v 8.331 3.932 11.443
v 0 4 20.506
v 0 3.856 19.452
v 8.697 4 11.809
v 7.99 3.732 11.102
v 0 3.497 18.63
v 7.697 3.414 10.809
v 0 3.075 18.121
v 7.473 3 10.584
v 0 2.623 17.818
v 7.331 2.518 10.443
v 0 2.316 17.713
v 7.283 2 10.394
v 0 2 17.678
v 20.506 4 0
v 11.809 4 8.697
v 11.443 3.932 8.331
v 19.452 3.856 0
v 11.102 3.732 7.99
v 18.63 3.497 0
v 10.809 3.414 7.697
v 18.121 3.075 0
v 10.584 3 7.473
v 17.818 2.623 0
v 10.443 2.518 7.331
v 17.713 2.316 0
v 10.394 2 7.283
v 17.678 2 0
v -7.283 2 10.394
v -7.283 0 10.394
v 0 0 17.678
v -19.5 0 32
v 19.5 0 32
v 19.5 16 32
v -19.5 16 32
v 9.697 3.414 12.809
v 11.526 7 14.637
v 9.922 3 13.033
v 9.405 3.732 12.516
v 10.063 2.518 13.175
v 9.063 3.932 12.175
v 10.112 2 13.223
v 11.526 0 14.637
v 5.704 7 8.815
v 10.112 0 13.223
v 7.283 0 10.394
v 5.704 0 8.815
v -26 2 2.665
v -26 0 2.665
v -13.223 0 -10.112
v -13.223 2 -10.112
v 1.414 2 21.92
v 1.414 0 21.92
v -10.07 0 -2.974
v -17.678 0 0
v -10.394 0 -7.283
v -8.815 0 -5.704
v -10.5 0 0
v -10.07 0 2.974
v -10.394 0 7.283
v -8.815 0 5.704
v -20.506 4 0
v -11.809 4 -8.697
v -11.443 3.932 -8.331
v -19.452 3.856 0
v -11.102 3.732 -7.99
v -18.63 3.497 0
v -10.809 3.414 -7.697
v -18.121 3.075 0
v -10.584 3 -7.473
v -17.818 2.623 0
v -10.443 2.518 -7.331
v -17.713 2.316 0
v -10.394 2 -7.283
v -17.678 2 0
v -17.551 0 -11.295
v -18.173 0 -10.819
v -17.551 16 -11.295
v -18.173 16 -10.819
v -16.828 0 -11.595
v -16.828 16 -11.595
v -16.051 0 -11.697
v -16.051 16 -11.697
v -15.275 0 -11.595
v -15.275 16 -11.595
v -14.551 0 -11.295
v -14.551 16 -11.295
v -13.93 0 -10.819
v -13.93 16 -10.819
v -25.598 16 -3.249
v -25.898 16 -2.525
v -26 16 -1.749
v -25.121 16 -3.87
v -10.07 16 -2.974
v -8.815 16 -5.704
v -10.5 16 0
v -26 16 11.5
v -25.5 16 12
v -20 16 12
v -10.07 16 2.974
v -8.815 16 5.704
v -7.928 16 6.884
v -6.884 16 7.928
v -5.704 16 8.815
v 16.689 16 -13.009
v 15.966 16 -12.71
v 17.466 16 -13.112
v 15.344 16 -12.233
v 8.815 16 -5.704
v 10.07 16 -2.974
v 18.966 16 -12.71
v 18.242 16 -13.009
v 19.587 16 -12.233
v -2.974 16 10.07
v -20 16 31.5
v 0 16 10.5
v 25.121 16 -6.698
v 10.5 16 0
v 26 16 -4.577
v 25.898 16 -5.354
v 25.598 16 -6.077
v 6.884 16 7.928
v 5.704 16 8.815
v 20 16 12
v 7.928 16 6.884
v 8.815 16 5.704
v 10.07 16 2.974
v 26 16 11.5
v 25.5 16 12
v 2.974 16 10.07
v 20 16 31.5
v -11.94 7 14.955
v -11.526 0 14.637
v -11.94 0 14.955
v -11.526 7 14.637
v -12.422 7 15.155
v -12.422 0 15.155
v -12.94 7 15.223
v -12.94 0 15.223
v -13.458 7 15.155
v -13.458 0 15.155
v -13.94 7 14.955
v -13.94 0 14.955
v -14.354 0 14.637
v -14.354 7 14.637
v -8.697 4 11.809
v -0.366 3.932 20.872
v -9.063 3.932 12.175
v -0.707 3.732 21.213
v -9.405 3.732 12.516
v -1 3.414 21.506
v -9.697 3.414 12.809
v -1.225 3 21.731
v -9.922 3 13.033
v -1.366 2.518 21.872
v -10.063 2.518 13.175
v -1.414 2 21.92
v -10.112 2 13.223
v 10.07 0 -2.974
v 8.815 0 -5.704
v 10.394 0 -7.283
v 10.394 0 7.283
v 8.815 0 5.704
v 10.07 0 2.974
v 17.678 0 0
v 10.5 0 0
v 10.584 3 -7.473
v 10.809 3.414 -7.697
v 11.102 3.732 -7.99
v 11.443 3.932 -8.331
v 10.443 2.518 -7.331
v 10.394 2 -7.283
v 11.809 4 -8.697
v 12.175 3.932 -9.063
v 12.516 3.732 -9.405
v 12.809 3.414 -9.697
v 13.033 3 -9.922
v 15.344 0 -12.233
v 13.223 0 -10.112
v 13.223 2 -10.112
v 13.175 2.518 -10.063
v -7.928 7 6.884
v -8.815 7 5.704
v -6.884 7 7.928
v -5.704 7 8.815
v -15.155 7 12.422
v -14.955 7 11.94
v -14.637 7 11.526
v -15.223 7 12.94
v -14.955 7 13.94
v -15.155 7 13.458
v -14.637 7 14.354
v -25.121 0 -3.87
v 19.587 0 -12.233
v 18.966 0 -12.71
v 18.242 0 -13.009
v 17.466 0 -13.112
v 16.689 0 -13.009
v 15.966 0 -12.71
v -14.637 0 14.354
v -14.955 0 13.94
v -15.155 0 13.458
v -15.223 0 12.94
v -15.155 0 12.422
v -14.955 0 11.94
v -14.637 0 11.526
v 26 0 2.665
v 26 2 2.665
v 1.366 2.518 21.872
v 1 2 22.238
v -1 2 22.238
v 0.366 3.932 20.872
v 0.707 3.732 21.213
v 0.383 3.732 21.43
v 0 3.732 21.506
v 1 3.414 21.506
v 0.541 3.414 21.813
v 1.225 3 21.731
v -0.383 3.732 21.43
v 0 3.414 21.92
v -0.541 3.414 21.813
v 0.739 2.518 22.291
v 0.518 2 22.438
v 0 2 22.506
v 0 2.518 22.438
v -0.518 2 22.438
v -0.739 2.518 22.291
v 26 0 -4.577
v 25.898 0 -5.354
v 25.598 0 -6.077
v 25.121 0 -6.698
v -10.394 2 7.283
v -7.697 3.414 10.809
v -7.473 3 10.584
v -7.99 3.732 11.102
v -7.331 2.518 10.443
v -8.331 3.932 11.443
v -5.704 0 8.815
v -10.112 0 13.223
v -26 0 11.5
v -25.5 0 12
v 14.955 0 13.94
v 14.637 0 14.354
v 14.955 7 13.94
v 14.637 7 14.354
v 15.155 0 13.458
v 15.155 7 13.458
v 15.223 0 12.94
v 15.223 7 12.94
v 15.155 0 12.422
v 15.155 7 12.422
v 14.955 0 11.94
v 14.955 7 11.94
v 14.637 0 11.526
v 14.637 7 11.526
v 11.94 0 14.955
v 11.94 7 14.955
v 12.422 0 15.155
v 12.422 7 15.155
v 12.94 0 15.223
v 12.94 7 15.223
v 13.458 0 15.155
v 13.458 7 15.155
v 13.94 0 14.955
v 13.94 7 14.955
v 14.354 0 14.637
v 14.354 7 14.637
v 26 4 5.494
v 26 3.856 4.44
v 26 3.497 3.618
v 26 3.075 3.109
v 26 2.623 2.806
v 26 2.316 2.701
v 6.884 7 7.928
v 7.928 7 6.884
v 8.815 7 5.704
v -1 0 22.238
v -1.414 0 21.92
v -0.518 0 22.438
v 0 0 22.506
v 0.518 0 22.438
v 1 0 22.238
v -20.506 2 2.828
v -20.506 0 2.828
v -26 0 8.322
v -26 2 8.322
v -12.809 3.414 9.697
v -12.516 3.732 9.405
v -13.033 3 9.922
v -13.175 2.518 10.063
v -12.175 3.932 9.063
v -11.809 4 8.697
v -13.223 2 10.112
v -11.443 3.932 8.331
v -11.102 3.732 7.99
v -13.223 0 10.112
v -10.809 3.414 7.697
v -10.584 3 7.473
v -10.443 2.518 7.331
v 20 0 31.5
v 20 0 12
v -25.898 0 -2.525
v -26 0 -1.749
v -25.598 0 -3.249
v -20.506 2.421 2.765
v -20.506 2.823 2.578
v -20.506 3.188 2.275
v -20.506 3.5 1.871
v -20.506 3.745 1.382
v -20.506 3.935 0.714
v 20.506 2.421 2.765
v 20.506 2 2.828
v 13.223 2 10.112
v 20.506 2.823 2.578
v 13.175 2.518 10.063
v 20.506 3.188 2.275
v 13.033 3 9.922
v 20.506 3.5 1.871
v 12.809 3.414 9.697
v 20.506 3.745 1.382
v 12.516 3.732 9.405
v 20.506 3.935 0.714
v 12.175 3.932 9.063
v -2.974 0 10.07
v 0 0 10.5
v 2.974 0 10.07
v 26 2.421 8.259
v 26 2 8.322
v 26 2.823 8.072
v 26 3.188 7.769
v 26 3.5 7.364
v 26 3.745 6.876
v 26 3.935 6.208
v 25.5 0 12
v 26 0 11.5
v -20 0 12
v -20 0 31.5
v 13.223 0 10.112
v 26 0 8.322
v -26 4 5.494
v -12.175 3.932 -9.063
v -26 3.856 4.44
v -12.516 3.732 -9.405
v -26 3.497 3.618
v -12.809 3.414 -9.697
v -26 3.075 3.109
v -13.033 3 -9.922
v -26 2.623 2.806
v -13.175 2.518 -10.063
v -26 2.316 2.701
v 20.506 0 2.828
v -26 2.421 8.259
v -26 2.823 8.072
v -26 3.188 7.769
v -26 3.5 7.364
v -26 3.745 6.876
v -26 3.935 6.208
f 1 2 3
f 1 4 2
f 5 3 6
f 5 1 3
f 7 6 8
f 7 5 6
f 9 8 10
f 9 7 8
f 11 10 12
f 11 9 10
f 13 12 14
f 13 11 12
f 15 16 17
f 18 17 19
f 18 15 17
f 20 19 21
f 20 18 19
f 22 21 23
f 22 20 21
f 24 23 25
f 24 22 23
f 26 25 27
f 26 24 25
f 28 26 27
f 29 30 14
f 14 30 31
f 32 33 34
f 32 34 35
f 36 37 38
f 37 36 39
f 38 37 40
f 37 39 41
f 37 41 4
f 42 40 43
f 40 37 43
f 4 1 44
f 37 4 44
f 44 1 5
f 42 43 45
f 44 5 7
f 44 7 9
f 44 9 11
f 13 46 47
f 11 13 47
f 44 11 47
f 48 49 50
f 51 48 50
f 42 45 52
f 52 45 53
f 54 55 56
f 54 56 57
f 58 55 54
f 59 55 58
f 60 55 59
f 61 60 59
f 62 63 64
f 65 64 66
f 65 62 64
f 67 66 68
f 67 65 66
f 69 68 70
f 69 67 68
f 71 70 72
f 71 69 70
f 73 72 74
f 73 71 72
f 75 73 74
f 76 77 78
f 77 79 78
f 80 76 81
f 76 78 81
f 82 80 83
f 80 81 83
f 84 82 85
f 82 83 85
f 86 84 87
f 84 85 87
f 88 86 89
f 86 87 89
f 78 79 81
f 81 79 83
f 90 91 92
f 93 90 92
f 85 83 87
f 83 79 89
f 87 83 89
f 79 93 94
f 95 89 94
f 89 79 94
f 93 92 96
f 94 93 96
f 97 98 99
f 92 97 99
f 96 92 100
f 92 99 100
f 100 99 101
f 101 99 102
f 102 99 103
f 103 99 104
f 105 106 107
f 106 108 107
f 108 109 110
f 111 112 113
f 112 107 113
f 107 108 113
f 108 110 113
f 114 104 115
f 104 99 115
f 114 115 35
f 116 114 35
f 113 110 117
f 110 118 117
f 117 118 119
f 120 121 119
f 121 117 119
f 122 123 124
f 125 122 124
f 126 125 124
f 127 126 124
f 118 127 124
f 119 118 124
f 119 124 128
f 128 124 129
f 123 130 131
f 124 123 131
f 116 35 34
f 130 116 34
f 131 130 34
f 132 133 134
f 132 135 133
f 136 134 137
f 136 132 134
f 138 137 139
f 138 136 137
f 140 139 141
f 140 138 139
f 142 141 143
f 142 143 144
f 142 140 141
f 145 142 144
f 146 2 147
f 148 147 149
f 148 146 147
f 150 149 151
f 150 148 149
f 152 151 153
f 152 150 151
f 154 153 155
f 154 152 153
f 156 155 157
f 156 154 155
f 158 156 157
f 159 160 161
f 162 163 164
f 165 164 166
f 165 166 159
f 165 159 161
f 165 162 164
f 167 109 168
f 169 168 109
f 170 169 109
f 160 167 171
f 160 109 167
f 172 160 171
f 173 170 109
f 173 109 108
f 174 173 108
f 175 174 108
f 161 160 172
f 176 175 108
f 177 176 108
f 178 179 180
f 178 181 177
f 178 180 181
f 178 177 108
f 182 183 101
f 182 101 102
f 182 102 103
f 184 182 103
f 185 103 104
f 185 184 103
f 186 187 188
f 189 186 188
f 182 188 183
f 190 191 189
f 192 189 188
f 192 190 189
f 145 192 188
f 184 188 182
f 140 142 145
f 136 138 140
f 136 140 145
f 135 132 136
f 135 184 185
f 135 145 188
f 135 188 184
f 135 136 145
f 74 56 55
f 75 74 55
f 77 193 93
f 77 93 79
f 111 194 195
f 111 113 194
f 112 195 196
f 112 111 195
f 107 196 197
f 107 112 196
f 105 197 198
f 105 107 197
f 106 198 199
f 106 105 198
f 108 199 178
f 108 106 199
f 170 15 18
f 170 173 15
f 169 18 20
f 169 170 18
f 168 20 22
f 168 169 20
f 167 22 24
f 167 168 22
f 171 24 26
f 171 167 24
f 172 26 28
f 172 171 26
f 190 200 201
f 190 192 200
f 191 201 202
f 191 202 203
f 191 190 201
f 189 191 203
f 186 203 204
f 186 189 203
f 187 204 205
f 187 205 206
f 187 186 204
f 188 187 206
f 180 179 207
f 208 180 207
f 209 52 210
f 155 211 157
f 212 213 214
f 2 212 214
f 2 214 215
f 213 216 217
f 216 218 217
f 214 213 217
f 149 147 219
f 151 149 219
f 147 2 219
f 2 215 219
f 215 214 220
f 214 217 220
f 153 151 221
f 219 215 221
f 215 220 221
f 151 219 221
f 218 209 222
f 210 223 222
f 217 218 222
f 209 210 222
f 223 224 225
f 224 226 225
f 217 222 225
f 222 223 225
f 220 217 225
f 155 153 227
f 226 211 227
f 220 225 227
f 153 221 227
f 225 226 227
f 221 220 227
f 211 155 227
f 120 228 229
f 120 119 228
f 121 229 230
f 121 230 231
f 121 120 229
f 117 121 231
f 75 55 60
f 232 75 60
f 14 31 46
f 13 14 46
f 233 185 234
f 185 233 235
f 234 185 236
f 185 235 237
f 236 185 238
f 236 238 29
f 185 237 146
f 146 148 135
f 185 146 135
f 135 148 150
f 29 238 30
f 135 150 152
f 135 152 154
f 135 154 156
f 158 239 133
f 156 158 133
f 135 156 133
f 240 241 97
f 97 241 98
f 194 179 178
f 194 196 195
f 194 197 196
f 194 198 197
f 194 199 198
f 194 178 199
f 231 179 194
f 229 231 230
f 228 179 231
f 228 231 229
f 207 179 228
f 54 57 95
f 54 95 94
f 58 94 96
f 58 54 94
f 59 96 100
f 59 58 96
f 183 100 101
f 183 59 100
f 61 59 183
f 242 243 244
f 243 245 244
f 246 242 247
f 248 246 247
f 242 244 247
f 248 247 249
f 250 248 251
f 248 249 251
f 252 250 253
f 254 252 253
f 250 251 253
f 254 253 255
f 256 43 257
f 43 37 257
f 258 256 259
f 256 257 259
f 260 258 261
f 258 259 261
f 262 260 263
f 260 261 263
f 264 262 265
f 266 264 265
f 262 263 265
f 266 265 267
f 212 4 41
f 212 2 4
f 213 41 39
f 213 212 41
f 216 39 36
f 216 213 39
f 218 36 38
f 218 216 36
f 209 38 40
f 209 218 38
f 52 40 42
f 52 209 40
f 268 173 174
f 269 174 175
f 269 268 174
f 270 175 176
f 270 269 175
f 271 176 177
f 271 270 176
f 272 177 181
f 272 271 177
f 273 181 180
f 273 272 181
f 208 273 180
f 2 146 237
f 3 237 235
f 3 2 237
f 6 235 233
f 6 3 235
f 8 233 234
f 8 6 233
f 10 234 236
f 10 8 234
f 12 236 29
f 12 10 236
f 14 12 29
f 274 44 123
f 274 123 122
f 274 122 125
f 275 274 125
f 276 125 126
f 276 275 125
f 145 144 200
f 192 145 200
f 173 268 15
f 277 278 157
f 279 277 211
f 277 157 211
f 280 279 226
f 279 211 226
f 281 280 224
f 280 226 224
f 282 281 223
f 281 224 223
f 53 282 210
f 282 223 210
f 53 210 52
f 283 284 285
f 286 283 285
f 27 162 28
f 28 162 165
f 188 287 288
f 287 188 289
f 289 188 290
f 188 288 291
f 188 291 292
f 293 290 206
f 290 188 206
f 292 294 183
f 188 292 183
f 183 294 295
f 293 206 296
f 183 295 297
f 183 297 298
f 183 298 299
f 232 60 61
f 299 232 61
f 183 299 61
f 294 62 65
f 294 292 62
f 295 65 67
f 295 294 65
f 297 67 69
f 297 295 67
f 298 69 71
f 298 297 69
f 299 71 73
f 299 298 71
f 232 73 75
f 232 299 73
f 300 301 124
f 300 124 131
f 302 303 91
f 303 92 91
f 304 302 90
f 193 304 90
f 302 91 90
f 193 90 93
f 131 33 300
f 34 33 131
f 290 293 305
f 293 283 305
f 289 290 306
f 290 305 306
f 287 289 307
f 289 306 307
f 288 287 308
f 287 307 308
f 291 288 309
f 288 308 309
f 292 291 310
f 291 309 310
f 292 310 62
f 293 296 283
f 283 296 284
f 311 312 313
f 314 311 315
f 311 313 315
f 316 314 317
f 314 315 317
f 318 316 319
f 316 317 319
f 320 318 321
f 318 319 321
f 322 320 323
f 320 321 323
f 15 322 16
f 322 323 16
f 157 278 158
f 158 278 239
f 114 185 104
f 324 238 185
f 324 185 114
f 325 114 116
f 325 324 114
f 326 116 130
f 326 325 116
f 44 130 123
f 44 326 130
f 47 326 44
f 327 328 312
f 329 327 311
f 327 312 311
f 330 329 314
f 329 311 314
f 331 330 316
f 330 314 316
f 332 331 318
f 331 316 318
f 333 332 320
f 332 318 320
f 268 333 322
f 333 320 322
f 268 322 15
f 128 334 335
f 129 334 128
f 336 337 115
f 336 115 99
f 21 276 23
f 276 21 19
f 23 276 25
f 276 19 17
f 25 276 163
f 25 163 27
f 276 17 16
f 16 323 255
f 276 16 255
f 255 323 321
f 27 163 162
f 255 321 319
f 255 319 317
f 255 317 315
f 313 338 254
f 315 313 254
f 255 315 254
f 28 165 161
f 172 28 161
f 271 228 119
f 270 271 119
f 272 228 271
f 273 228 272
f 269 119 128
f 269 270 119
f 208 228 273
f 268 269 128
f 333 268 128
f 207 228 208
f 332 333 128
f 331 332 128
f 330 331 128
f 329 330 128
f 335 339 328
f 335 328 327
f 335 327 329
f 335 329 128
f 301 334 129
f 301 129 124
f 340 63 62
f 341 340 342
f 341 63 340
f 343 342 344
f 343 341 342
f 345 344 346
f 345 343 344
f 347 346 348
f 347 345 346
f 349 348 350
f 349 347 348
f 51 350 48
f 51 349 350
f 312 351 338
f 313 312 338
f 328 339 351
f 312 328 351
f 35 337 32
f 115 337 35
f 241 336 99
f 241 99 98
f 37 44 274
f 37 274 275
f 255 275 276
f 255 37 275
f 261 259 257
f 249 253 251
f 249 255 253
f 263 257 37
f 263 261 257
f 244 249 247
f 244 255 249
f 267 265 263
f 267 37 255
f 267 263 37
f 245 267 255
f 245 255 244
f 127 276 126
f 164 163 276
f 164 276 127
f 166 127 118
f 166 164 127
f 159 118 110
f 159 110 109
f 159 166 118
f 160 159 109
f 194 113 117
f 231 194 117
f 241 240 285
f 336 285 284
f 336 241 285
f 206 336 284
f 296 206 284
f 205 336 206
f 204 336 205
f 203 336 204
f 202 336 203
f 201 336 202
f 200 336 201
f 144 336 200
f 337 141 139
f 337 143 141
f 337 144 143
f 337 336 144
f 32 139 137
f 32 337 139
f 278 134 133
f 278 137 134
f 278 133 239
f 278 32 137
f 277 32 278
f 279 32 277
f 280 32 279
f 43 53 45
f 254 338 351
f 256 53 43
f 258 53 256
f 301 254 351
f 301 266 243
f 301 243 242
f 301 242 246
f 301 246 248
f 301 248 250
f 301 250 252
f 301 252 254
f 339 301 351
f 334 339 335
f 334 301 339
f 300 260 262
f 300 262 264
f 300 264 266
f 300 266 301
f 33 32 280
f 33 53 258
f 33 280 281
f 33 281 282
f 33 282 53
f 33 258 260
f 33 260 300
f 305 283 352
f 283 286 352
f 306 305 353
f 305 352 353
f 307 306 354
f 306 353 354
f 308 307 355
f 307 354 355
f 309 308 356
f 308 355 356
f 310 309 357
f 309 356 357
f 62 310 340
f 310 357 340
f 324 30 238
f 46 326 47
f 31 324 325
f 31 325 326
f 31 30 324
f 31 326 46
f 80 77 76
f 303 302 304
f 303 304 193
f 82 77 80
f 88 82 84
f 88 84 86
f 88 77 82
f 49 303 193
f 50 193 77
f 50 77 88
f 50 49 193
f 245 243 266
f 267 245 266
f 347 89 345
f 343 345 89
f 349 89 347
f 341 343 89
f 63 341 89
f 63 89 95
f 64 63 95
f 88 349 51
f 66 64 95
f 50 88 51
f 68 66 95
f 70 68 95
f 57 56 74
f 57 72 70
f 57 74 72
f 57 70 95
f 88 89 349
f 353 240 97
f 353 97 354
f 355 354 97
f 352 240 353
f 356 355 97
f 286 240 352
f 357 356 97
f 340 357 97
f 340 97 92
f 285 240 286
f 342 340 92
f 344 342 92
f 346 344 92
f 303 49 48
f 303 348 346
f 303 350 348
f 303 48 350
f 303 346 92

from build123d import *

# Parameters (mm, degrees)
F1_DEPTH = 16
F2_DEPTH = 7
F3_DEPTH = 4
F4_R     = 2
F5_R     = 1.9999
F6_R     = 3
F7_SIZE  = 0.5


# Not quite as in the source:
# - a fillet or chamfer is up to 0.001 mm smaller than in the source, because OpenCascade refuses the exact size
# - a feature names something its author has since deleted; it is built from what else it names


with BuildPart() as f1:
    # F0 (on Front) → F1 (new body)
    with BuildSketch(Plane.XZ):
        with BuildLine():
            ThreePointArc((-5.7041860158, 8.815455853), (0, 10.5), (5.7041860158, 8.815455853))
            Line((5.7041860158, 8.815455853), (7.2831998462, 10.3944696834))
            Line((7.2831998462, 10.3944696834), (0, 17.6776695297))
            Line((0, 17.6776695297), (-7.2831998462, 10.3944696834))
            Line((-7.2831998462, 10.3944696834), (-5.7041860158, 8.815455853))
        make_face()
        with BuildLine():
            ThreePointArc((-8.815455853, 5.7041860158), (-7.4246212025, 7.4246212025), (-5.7041860158, 8.815455853))
            Line((-5.7041860158, 8.815455853), (-7.2831998462, 10.3944696834))
            Line((-7.2831998462, 10.3944696834), (-10.3944696834, 7.2831998462))
            Line((-10.3944696834, 7.2831998462), (-8.815455853, 5.7041860158))
        make_face()
        with BuildLine():
            ThreePointArc((-8.815455853, -5.7041860158), (-10.5, 0), (-8.815455853, 5.7041860158))
            Line((-8.815455853, 5.7041860158), (-10.3944696834, 7.2831998462))
            Line((-10.3944696834, 7.2831998462), (-17.6776695297, 0))
            Line((-17.6776695297, 0), (-10.3944696834, -7.2831998462))
            Line((-10.3944696834, -7.2831998462), (-8.815455853, -5.7041860158))
        make_face()
        with BuildLine():
            ThreePointArc((5.7041860158, 8.815455853), (7.4246212025, 7.4246212025), (8.815455853, 5.7041860158))
            Line((8.815455853, 5.7041860158), (10.3944696834, 7.2831998462))
            Line((10.3944696834, 7.2831998462), (7.2831998462, 10.3944696834))
            Line((7.2831998462, 10.3944696834), (5.7041860158, 8.815455853))
        make_face()
        Polygon((0, 17.6776695297), (7.2831998462, 10.3944696834), (10.111626971, 13.2228968082), (0, 23.3345237792), (-10.111626971, 13.2228968082), (-7.2831998462, 10.3944696834), align=None)
        Polygon((7.2831998462, 10.3944696834), (10.3944696834, 7.2831998462), (13.2228968082, 10.111626971), (10.111626971, 13.2228968082), align=None)
        Polygon((-10.3944696834, 7.2831998462), (-7.2831998462, 10.3944696834), (-10.111626971, 13.2228968082), (-13.2228968082, 10.111626971), align=None)
        Polygon((-17.6776695297, 0), (-10.3944696834, 7.2831998462), (-13.2228968082, 10.111626971), (-20.5060966544, 2.8284271247), (-26, 8.3223304703), (-26, 2.6654762208), (-13.2228968082, -10.111626971), (-10.3944696834, -7.2831998462), align=None)
        Polygon((-13.2228968082, 10.111626971), (-10.111626971, 13.2228968082), (-12.9400540957, 16.0513239329), (-16.0513239329, 12.9400540957), align=None)
        Polygon((17.6776695297, 0), (10.3944696834, -7.2831998462), (13.2228968082, -10.111626971), (26, 2.6654762208), (26, 8.3223304703), (20.5060966544, 2.8284271247), (13.2228968082, 10.111626971), (10.3944696834, 7.2831998462), align=None)
        with BuildLine():
            ThreePointArc((8.815455853, 5.7041860158), (10.5, 0), (8.815455853, -5.7041860158))
            Line((8.815455853, -5.7041860158), (10.3944696834, -7.2831998462))
            Line((10.3944696834, -7.2831998462), (17.6776695297, 0))
            Line((17.6776695297, 0), (10.3944696834, 7.2831998462))
            Line((10.3944696834, 7.2831998462), (8.815455853, 5.7041860158))
        make_face()
        Polygon((16.0513239329, 12.9400540957), (13.2228968082, 10.111626971), (20.5060966544, 2.8284271247), (26, 8.3223304703), (26, 12), (20, 12), (20, 32), (0, 32), (-20, 32), (-20, 12), (-26, 12), (-26, 8.3223304703), (-20.5060966544, 2.8284271247), (-13.2228968082, 10.111626971), (-16.0513239329, 12.9400540957), (-12.9400540957, 16.0513239329), (-10.111626971, 13.2228968082), (0, 23.3345237792), (10.111626971, 13.2228968082), (12.9400540957, 16.0513239329), align=None)
        Polygon((10.111626971, 13.2228968082), (13.2228968082, 10.111626971), (16.0513239329, 12.9400540957), (12.9400540957, 16.0513239329), align=None)
        Polygon((26, 2.6654762208), (13.2228968082, -10.111626971), (17.4655374953, -14.3542676581), (26, -5.8198051534), align=None)
        Polygon((-16.0513239329, -12.9400540957), (-13.2228968082, -10.111626971), (-26, 2.6654762208), (-26, -2.9913780286), align=None)
    extrude(amount=-F1_DEPTH)

    # F0 (on Front) → F2 (cut)
    with BuildSketch(Plane.XZ):
        Polygon((10.111626971, 13.2228968082), (13.2228968082, 10.111626971), (16.0513239329, 12.9400540957), (12.9400540957, 16.0513239329), align=None)
        Polygon((7.2831998462, 10.3944696834), (10.3944696834, 7.2831998462), (13.2228968082, 10.111626971), (10.111626971, 13.2228968082), align=None)
        with BuildLine():
            ThreePointArc((5.7041860158, 8.815455853), (7.4246212025, 7.4246212025), (8.815455853, 5.7041860158))
            Line((8.815455853, 5.7041860158), (10.3944696834, 7.2831998462))
            Line((10.3944696834, 7.2831998462), (7.2831998462, 10.3944696834))
            Line((7.2831998462, 10.3944696834), (5.7041860158, 8.815455853))
        make_face()
        with BuildLine():
            ThreePointArc((-8.815455853, 5.7041860158), (-7.4246212025, 7.4246212025), (-5.7041860158, 8.815455853))
            Line((-5.7041860158, 8.815455853), (-7.2831998462, 10.3944696834))
            Line((-7.2831998462, 10.3944696834), (-10.3944696834, 7.2831998462))
            Line((-10.3944696834, 7.2831998462), (-8.815455853, 5.7041860158))
        make_face()
        Polygon((-13.2228968082, 10.111626971), (-10.111626971, 13.2228968082), (-12.9400540957, 16.0513239329), (-16.0513239329, 12.9400540957), align=None)
        Polygon((-10.3944696834, 7.2831998462), (-7.2831998462, 10.3944696834), (-10.111626971, 13.2228968082), (-13.2228968082, 10.111626971), align=None)
    extrude(amount=-F2_DEPTH, mode=Mode.SUBTRACT)

    # F0 (on Front) → F3 (cut)
    with BuildSketch(Plane.XZ):
        Polygon((0, 17.6776695297), (7.2831998462, 10.3944696834), (10.111626971, 13.2228968082), (0, 23.3345237792), (-10.111626971, 13.2228968082), (-7.2831998462, 10.3944696834), align=None)
        Polygon((17.6776695297, 0), (10.3944696834, -7.2831998462), (13.2228968082, -10.111626971), (26, 2.6654762208), (26, 8.3223304703), (20.5060966544, 2.8284271247), (13.2228968082, 10.111626971), (10.3944696834, 7.2831998462), align=None)
        Polygon((-17.6776695297, 0), (-10.3944696834, 7.2831998462), (-13.2228968082, 10.111626971), (-20.5060966544, 2.8284271247), (-26, 8.3223304703), (-26, 2.6654762208), (-13.2228968082, -10.111626971), (-10.3944696834, -7.2831998462), align=None)
    extrude(amount=-F3_DEPTH, mode=Mode.SUBTRACT)

    # F4
    f4_edges = [f1.edges().sort_by_distance(p)[0] for p in [
        (-16.051324, 3.5, 12.940054),
        (-12.940054, 3.5, 16.051324),
        (12.940054, 3.5, 16.051324),
        (16.051324, 3.5, 12.940054),
        (0, 2, 23.334524),
    ]]
    fillet(f4_edges, radius=F4_R)

    # F5 (radius 2 in the source; OpenCascade refuses exactly that, so slightly less here)
    f5_edges = [f1.edges().sort_by_distance(p)[0] for p in [
        (19.611448, 4, -3.723075),
        (14.03607, 4, -3.6416),
        (14.03607, 4, 3.6416),
        (16.864497, 4, 6.470027),
        (5.76292, 4, 17.571604),
        (-16.864497, 4, 6.470027),
        (-23.253048, 4, 5.575379),
        (-14.03607, 4, -3.6416),
        (-3.6416, 4, 14.03607),
        (-14.03607, 4, 3.6416),
        (-19.611448, 4, -3.723075),
        (23.253048, 4, 5.575379),
        (0, 4, 22.506097),
        (-5.76292, 4, 17.571604),
        (3.6416, 4, 14.03607),
    ]]
    fillet(f5_edges, radius=F5_R)

    # F6
    f6_edges = [f1.edges().sort_by_distance(p)[0] for p in [
        (17.465537, 8, -14.354268),
        (-16.051324, 8, -12.940054),
        (26, 8, -5.819805),
        (-26, 8, -2.991378),
    ]]
    fillet(f6_edges, radius=F6_R)

    # F7
    f7_edges = [f1.edges().sort_by_distance(p)[0] for p in [
        (20, 8, 32),
        (26, 8, 12),
        (-20, 8, 32),
        (-26, 8, 12),
    ]]
    chamfer(f7_edges, length=F7_SIZE)


solid = f1.part
